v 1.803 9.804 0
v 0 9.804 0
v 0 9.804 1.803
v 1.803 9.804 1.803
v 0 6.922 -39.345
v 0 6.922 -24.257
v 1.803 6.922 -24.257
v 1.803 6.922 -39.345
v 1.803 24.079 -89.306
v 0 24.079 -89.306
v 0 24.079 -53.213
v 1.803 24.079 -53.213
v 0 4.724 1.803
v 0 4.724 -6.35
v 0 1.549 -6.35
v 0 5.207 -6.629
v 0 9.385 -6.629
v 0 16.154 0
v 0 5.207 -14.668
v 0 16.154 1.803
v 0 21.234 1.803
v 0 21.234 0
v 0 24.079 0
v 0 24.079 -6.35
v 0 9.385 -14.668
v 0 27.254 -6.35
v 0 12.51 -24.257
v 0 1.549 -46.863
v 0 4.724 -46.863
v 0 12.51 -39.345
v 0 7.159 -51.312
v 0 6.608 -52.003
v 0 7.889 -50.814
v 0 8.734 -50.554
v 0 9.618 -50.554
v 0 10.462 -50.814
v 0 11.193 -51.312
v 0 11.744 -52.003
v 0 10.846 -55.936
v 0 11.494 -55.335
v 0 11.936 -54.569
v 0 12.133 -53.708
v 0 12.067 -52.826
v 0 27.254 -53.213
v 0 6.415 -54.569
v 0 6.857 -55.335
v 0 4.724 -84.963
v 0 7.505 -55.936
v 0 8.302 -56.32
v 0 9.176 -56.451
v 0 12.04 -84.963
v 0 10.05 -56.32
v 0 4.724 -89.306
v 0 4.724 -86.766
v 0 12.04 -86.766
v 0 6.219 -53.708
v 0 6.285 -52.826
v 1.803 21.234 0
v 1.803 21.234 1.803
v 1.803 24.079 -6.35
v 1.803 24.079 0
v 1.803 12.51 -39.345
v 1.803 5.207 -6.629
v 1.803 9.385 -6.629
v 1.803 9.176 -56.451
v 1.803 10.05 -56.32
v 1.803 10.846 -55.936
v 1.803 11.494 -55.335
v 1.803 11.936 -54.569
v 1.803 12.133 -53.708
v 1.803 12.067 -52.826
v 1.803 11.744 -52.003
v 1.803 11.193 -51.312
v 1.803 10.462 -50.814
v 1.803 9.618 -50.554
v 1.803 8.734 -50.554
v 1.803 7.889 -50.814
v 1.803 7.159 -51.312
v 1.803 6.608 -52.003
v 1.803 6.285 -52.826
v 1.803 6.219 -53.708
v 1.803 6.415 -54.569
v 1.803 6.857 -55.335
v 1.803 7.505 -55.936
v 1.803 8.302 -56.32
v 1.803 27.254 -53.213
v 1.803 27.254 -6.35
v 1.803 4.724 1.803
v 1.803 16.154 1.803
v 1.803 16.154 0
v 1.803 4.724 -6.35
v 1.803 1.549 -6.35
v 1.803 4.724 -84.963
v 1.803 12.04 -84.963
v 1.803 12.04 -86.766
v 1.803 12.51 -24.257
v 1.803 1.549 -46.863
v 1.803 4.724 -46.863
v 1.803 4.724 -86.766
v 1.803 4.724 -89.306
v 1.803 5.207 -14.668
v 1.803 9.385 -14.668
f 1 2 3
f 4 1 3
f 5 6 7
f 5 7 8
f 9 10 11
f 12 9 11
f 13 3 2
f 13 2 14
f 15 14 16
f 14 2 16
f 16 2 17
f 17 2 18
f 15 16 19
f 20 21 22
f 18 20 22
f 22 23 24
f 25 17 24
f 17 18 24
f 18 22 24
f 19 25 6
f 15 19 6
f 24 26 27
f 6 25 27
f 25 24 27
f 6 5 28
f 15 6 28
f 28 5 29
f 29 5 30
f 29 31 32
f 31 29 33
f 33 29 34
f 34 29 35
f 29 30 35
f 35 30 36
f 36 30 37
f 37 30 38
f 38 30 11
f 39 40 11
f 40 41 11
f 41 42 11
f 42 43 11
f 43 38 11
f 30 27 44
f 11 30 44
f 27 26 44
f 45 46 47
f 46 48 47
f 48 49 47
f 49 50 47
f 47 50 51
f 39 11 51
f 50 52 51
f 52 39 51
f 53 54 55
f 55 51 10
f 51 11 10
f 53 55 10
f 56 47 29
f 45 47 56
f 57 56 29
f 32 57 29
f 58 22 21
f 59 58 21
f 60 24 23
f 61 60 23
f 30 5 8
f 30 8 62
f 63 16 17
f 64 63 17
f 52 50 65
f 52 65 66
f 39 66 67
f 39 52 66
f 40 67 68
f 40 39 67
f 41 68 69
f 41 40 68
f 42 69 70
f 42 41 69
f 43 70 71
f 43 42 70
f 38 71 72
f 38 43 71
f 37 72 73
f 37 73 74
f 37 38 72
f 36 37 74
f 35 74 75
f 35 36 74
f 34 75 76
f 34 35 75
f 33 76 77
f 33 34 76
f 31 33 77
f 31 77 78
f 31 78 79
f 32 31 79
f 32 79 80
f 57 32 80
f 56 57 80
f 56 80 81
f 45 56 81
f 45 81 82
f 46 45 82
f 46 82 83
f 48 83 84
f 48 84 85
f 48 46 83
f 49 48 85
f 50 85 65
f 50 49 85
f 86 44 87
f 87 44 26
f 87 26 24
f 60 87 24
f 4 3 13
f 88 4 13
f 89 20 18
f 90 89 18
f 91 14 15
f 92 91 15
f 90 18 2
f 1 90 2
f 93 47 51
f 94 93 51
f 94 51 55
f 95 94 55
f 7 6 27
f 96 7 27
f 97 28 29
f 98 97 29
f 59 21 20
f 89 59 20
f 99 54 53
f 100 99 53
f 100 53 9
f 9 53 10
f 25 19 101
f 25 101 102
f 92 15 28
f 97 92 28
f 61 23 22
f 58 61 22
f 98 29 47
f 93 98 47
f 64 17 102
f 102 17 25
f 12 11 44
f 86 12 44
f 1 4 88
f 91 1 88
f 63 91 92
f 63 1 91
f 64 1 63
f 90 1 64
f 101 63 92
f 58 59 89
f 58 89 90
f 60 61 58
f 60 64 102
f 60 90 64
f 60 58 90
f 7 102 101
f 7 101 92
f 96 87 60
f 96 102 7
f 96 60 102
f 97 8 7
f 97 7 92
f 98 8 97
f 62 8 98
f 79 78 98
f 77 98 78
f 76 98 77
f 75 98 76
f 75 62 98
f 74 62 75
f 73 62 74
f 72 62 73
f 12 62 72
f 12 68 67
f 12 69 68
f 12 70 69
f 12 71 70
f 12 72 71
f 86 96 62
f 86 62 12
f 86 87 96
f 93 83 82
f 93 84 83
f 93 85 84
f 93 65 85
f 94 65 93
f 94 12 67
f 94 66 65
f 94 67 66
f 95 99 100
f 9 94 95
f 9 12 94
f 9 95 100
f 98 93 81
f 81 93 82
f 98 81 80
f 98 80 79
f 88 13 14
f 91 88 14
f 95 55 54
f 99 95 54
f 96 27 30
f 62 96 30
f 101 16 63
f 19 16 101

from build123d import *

# Parameters (mm, degrees)
SKETCH2_W           = 8.0391
SKETCH2_H           = 4.1783
SKETCH2_W_2         = 15.0876
SKETCH2_H_2         = 5.588
SKETCH2_R           = 2.96545
BOSS_EXTRUDE1_DEPTH = 1.8034


with BuildPart() as part:
    # Sketch2 → Boss-Extrude1 (new body)
    with BuildSketch(Plane(origin=(0, 0, 0), x_dir=(0, 0, -1), z_dir=(1, 0, 0))):
        Polygon((6.35, 24.0792), (0, 24.0792), (0, 21.2344), (-1.8034, 21.2344), (-1.8034, 16.1544), (0, 16.1544), (0, 9.8044), (-1.8034, 9.8044), (-1.8034, 4.7244), (6.35, 4.7244), (6.35, 1.5494), (46.863, 1.5494), (46.863, 4.7244), (84.963, 4.7244), (84.963, 12.0396), (86.7664, 12.0396), (86.7664, 4.7244), (89.3064, 4.7244), (89.3064, 24.0792), (53.213, 24.0792), (53.213, 27.2542), (6.35, 27.2542), align=None)
        with Locations((10.64895, 7.29615)):
            Rectangle(SKETCH2_W, SKETCH2_H, mode=Mode.SUBTRACT)
        with Locations((31.8008, 9.7155)):
            Rectangle(SKETCH2_W_2, SKETCH2_H_2, mode=Mode.SUBTRACT)
        with Locations((53.48605, 9.17575)):
            Circle(SKETCH2_R, mode=Mode.SUBTRACT)
    extrude(amount=BOSS_EXTRUDE1_DEPTH)


solid = part.part
